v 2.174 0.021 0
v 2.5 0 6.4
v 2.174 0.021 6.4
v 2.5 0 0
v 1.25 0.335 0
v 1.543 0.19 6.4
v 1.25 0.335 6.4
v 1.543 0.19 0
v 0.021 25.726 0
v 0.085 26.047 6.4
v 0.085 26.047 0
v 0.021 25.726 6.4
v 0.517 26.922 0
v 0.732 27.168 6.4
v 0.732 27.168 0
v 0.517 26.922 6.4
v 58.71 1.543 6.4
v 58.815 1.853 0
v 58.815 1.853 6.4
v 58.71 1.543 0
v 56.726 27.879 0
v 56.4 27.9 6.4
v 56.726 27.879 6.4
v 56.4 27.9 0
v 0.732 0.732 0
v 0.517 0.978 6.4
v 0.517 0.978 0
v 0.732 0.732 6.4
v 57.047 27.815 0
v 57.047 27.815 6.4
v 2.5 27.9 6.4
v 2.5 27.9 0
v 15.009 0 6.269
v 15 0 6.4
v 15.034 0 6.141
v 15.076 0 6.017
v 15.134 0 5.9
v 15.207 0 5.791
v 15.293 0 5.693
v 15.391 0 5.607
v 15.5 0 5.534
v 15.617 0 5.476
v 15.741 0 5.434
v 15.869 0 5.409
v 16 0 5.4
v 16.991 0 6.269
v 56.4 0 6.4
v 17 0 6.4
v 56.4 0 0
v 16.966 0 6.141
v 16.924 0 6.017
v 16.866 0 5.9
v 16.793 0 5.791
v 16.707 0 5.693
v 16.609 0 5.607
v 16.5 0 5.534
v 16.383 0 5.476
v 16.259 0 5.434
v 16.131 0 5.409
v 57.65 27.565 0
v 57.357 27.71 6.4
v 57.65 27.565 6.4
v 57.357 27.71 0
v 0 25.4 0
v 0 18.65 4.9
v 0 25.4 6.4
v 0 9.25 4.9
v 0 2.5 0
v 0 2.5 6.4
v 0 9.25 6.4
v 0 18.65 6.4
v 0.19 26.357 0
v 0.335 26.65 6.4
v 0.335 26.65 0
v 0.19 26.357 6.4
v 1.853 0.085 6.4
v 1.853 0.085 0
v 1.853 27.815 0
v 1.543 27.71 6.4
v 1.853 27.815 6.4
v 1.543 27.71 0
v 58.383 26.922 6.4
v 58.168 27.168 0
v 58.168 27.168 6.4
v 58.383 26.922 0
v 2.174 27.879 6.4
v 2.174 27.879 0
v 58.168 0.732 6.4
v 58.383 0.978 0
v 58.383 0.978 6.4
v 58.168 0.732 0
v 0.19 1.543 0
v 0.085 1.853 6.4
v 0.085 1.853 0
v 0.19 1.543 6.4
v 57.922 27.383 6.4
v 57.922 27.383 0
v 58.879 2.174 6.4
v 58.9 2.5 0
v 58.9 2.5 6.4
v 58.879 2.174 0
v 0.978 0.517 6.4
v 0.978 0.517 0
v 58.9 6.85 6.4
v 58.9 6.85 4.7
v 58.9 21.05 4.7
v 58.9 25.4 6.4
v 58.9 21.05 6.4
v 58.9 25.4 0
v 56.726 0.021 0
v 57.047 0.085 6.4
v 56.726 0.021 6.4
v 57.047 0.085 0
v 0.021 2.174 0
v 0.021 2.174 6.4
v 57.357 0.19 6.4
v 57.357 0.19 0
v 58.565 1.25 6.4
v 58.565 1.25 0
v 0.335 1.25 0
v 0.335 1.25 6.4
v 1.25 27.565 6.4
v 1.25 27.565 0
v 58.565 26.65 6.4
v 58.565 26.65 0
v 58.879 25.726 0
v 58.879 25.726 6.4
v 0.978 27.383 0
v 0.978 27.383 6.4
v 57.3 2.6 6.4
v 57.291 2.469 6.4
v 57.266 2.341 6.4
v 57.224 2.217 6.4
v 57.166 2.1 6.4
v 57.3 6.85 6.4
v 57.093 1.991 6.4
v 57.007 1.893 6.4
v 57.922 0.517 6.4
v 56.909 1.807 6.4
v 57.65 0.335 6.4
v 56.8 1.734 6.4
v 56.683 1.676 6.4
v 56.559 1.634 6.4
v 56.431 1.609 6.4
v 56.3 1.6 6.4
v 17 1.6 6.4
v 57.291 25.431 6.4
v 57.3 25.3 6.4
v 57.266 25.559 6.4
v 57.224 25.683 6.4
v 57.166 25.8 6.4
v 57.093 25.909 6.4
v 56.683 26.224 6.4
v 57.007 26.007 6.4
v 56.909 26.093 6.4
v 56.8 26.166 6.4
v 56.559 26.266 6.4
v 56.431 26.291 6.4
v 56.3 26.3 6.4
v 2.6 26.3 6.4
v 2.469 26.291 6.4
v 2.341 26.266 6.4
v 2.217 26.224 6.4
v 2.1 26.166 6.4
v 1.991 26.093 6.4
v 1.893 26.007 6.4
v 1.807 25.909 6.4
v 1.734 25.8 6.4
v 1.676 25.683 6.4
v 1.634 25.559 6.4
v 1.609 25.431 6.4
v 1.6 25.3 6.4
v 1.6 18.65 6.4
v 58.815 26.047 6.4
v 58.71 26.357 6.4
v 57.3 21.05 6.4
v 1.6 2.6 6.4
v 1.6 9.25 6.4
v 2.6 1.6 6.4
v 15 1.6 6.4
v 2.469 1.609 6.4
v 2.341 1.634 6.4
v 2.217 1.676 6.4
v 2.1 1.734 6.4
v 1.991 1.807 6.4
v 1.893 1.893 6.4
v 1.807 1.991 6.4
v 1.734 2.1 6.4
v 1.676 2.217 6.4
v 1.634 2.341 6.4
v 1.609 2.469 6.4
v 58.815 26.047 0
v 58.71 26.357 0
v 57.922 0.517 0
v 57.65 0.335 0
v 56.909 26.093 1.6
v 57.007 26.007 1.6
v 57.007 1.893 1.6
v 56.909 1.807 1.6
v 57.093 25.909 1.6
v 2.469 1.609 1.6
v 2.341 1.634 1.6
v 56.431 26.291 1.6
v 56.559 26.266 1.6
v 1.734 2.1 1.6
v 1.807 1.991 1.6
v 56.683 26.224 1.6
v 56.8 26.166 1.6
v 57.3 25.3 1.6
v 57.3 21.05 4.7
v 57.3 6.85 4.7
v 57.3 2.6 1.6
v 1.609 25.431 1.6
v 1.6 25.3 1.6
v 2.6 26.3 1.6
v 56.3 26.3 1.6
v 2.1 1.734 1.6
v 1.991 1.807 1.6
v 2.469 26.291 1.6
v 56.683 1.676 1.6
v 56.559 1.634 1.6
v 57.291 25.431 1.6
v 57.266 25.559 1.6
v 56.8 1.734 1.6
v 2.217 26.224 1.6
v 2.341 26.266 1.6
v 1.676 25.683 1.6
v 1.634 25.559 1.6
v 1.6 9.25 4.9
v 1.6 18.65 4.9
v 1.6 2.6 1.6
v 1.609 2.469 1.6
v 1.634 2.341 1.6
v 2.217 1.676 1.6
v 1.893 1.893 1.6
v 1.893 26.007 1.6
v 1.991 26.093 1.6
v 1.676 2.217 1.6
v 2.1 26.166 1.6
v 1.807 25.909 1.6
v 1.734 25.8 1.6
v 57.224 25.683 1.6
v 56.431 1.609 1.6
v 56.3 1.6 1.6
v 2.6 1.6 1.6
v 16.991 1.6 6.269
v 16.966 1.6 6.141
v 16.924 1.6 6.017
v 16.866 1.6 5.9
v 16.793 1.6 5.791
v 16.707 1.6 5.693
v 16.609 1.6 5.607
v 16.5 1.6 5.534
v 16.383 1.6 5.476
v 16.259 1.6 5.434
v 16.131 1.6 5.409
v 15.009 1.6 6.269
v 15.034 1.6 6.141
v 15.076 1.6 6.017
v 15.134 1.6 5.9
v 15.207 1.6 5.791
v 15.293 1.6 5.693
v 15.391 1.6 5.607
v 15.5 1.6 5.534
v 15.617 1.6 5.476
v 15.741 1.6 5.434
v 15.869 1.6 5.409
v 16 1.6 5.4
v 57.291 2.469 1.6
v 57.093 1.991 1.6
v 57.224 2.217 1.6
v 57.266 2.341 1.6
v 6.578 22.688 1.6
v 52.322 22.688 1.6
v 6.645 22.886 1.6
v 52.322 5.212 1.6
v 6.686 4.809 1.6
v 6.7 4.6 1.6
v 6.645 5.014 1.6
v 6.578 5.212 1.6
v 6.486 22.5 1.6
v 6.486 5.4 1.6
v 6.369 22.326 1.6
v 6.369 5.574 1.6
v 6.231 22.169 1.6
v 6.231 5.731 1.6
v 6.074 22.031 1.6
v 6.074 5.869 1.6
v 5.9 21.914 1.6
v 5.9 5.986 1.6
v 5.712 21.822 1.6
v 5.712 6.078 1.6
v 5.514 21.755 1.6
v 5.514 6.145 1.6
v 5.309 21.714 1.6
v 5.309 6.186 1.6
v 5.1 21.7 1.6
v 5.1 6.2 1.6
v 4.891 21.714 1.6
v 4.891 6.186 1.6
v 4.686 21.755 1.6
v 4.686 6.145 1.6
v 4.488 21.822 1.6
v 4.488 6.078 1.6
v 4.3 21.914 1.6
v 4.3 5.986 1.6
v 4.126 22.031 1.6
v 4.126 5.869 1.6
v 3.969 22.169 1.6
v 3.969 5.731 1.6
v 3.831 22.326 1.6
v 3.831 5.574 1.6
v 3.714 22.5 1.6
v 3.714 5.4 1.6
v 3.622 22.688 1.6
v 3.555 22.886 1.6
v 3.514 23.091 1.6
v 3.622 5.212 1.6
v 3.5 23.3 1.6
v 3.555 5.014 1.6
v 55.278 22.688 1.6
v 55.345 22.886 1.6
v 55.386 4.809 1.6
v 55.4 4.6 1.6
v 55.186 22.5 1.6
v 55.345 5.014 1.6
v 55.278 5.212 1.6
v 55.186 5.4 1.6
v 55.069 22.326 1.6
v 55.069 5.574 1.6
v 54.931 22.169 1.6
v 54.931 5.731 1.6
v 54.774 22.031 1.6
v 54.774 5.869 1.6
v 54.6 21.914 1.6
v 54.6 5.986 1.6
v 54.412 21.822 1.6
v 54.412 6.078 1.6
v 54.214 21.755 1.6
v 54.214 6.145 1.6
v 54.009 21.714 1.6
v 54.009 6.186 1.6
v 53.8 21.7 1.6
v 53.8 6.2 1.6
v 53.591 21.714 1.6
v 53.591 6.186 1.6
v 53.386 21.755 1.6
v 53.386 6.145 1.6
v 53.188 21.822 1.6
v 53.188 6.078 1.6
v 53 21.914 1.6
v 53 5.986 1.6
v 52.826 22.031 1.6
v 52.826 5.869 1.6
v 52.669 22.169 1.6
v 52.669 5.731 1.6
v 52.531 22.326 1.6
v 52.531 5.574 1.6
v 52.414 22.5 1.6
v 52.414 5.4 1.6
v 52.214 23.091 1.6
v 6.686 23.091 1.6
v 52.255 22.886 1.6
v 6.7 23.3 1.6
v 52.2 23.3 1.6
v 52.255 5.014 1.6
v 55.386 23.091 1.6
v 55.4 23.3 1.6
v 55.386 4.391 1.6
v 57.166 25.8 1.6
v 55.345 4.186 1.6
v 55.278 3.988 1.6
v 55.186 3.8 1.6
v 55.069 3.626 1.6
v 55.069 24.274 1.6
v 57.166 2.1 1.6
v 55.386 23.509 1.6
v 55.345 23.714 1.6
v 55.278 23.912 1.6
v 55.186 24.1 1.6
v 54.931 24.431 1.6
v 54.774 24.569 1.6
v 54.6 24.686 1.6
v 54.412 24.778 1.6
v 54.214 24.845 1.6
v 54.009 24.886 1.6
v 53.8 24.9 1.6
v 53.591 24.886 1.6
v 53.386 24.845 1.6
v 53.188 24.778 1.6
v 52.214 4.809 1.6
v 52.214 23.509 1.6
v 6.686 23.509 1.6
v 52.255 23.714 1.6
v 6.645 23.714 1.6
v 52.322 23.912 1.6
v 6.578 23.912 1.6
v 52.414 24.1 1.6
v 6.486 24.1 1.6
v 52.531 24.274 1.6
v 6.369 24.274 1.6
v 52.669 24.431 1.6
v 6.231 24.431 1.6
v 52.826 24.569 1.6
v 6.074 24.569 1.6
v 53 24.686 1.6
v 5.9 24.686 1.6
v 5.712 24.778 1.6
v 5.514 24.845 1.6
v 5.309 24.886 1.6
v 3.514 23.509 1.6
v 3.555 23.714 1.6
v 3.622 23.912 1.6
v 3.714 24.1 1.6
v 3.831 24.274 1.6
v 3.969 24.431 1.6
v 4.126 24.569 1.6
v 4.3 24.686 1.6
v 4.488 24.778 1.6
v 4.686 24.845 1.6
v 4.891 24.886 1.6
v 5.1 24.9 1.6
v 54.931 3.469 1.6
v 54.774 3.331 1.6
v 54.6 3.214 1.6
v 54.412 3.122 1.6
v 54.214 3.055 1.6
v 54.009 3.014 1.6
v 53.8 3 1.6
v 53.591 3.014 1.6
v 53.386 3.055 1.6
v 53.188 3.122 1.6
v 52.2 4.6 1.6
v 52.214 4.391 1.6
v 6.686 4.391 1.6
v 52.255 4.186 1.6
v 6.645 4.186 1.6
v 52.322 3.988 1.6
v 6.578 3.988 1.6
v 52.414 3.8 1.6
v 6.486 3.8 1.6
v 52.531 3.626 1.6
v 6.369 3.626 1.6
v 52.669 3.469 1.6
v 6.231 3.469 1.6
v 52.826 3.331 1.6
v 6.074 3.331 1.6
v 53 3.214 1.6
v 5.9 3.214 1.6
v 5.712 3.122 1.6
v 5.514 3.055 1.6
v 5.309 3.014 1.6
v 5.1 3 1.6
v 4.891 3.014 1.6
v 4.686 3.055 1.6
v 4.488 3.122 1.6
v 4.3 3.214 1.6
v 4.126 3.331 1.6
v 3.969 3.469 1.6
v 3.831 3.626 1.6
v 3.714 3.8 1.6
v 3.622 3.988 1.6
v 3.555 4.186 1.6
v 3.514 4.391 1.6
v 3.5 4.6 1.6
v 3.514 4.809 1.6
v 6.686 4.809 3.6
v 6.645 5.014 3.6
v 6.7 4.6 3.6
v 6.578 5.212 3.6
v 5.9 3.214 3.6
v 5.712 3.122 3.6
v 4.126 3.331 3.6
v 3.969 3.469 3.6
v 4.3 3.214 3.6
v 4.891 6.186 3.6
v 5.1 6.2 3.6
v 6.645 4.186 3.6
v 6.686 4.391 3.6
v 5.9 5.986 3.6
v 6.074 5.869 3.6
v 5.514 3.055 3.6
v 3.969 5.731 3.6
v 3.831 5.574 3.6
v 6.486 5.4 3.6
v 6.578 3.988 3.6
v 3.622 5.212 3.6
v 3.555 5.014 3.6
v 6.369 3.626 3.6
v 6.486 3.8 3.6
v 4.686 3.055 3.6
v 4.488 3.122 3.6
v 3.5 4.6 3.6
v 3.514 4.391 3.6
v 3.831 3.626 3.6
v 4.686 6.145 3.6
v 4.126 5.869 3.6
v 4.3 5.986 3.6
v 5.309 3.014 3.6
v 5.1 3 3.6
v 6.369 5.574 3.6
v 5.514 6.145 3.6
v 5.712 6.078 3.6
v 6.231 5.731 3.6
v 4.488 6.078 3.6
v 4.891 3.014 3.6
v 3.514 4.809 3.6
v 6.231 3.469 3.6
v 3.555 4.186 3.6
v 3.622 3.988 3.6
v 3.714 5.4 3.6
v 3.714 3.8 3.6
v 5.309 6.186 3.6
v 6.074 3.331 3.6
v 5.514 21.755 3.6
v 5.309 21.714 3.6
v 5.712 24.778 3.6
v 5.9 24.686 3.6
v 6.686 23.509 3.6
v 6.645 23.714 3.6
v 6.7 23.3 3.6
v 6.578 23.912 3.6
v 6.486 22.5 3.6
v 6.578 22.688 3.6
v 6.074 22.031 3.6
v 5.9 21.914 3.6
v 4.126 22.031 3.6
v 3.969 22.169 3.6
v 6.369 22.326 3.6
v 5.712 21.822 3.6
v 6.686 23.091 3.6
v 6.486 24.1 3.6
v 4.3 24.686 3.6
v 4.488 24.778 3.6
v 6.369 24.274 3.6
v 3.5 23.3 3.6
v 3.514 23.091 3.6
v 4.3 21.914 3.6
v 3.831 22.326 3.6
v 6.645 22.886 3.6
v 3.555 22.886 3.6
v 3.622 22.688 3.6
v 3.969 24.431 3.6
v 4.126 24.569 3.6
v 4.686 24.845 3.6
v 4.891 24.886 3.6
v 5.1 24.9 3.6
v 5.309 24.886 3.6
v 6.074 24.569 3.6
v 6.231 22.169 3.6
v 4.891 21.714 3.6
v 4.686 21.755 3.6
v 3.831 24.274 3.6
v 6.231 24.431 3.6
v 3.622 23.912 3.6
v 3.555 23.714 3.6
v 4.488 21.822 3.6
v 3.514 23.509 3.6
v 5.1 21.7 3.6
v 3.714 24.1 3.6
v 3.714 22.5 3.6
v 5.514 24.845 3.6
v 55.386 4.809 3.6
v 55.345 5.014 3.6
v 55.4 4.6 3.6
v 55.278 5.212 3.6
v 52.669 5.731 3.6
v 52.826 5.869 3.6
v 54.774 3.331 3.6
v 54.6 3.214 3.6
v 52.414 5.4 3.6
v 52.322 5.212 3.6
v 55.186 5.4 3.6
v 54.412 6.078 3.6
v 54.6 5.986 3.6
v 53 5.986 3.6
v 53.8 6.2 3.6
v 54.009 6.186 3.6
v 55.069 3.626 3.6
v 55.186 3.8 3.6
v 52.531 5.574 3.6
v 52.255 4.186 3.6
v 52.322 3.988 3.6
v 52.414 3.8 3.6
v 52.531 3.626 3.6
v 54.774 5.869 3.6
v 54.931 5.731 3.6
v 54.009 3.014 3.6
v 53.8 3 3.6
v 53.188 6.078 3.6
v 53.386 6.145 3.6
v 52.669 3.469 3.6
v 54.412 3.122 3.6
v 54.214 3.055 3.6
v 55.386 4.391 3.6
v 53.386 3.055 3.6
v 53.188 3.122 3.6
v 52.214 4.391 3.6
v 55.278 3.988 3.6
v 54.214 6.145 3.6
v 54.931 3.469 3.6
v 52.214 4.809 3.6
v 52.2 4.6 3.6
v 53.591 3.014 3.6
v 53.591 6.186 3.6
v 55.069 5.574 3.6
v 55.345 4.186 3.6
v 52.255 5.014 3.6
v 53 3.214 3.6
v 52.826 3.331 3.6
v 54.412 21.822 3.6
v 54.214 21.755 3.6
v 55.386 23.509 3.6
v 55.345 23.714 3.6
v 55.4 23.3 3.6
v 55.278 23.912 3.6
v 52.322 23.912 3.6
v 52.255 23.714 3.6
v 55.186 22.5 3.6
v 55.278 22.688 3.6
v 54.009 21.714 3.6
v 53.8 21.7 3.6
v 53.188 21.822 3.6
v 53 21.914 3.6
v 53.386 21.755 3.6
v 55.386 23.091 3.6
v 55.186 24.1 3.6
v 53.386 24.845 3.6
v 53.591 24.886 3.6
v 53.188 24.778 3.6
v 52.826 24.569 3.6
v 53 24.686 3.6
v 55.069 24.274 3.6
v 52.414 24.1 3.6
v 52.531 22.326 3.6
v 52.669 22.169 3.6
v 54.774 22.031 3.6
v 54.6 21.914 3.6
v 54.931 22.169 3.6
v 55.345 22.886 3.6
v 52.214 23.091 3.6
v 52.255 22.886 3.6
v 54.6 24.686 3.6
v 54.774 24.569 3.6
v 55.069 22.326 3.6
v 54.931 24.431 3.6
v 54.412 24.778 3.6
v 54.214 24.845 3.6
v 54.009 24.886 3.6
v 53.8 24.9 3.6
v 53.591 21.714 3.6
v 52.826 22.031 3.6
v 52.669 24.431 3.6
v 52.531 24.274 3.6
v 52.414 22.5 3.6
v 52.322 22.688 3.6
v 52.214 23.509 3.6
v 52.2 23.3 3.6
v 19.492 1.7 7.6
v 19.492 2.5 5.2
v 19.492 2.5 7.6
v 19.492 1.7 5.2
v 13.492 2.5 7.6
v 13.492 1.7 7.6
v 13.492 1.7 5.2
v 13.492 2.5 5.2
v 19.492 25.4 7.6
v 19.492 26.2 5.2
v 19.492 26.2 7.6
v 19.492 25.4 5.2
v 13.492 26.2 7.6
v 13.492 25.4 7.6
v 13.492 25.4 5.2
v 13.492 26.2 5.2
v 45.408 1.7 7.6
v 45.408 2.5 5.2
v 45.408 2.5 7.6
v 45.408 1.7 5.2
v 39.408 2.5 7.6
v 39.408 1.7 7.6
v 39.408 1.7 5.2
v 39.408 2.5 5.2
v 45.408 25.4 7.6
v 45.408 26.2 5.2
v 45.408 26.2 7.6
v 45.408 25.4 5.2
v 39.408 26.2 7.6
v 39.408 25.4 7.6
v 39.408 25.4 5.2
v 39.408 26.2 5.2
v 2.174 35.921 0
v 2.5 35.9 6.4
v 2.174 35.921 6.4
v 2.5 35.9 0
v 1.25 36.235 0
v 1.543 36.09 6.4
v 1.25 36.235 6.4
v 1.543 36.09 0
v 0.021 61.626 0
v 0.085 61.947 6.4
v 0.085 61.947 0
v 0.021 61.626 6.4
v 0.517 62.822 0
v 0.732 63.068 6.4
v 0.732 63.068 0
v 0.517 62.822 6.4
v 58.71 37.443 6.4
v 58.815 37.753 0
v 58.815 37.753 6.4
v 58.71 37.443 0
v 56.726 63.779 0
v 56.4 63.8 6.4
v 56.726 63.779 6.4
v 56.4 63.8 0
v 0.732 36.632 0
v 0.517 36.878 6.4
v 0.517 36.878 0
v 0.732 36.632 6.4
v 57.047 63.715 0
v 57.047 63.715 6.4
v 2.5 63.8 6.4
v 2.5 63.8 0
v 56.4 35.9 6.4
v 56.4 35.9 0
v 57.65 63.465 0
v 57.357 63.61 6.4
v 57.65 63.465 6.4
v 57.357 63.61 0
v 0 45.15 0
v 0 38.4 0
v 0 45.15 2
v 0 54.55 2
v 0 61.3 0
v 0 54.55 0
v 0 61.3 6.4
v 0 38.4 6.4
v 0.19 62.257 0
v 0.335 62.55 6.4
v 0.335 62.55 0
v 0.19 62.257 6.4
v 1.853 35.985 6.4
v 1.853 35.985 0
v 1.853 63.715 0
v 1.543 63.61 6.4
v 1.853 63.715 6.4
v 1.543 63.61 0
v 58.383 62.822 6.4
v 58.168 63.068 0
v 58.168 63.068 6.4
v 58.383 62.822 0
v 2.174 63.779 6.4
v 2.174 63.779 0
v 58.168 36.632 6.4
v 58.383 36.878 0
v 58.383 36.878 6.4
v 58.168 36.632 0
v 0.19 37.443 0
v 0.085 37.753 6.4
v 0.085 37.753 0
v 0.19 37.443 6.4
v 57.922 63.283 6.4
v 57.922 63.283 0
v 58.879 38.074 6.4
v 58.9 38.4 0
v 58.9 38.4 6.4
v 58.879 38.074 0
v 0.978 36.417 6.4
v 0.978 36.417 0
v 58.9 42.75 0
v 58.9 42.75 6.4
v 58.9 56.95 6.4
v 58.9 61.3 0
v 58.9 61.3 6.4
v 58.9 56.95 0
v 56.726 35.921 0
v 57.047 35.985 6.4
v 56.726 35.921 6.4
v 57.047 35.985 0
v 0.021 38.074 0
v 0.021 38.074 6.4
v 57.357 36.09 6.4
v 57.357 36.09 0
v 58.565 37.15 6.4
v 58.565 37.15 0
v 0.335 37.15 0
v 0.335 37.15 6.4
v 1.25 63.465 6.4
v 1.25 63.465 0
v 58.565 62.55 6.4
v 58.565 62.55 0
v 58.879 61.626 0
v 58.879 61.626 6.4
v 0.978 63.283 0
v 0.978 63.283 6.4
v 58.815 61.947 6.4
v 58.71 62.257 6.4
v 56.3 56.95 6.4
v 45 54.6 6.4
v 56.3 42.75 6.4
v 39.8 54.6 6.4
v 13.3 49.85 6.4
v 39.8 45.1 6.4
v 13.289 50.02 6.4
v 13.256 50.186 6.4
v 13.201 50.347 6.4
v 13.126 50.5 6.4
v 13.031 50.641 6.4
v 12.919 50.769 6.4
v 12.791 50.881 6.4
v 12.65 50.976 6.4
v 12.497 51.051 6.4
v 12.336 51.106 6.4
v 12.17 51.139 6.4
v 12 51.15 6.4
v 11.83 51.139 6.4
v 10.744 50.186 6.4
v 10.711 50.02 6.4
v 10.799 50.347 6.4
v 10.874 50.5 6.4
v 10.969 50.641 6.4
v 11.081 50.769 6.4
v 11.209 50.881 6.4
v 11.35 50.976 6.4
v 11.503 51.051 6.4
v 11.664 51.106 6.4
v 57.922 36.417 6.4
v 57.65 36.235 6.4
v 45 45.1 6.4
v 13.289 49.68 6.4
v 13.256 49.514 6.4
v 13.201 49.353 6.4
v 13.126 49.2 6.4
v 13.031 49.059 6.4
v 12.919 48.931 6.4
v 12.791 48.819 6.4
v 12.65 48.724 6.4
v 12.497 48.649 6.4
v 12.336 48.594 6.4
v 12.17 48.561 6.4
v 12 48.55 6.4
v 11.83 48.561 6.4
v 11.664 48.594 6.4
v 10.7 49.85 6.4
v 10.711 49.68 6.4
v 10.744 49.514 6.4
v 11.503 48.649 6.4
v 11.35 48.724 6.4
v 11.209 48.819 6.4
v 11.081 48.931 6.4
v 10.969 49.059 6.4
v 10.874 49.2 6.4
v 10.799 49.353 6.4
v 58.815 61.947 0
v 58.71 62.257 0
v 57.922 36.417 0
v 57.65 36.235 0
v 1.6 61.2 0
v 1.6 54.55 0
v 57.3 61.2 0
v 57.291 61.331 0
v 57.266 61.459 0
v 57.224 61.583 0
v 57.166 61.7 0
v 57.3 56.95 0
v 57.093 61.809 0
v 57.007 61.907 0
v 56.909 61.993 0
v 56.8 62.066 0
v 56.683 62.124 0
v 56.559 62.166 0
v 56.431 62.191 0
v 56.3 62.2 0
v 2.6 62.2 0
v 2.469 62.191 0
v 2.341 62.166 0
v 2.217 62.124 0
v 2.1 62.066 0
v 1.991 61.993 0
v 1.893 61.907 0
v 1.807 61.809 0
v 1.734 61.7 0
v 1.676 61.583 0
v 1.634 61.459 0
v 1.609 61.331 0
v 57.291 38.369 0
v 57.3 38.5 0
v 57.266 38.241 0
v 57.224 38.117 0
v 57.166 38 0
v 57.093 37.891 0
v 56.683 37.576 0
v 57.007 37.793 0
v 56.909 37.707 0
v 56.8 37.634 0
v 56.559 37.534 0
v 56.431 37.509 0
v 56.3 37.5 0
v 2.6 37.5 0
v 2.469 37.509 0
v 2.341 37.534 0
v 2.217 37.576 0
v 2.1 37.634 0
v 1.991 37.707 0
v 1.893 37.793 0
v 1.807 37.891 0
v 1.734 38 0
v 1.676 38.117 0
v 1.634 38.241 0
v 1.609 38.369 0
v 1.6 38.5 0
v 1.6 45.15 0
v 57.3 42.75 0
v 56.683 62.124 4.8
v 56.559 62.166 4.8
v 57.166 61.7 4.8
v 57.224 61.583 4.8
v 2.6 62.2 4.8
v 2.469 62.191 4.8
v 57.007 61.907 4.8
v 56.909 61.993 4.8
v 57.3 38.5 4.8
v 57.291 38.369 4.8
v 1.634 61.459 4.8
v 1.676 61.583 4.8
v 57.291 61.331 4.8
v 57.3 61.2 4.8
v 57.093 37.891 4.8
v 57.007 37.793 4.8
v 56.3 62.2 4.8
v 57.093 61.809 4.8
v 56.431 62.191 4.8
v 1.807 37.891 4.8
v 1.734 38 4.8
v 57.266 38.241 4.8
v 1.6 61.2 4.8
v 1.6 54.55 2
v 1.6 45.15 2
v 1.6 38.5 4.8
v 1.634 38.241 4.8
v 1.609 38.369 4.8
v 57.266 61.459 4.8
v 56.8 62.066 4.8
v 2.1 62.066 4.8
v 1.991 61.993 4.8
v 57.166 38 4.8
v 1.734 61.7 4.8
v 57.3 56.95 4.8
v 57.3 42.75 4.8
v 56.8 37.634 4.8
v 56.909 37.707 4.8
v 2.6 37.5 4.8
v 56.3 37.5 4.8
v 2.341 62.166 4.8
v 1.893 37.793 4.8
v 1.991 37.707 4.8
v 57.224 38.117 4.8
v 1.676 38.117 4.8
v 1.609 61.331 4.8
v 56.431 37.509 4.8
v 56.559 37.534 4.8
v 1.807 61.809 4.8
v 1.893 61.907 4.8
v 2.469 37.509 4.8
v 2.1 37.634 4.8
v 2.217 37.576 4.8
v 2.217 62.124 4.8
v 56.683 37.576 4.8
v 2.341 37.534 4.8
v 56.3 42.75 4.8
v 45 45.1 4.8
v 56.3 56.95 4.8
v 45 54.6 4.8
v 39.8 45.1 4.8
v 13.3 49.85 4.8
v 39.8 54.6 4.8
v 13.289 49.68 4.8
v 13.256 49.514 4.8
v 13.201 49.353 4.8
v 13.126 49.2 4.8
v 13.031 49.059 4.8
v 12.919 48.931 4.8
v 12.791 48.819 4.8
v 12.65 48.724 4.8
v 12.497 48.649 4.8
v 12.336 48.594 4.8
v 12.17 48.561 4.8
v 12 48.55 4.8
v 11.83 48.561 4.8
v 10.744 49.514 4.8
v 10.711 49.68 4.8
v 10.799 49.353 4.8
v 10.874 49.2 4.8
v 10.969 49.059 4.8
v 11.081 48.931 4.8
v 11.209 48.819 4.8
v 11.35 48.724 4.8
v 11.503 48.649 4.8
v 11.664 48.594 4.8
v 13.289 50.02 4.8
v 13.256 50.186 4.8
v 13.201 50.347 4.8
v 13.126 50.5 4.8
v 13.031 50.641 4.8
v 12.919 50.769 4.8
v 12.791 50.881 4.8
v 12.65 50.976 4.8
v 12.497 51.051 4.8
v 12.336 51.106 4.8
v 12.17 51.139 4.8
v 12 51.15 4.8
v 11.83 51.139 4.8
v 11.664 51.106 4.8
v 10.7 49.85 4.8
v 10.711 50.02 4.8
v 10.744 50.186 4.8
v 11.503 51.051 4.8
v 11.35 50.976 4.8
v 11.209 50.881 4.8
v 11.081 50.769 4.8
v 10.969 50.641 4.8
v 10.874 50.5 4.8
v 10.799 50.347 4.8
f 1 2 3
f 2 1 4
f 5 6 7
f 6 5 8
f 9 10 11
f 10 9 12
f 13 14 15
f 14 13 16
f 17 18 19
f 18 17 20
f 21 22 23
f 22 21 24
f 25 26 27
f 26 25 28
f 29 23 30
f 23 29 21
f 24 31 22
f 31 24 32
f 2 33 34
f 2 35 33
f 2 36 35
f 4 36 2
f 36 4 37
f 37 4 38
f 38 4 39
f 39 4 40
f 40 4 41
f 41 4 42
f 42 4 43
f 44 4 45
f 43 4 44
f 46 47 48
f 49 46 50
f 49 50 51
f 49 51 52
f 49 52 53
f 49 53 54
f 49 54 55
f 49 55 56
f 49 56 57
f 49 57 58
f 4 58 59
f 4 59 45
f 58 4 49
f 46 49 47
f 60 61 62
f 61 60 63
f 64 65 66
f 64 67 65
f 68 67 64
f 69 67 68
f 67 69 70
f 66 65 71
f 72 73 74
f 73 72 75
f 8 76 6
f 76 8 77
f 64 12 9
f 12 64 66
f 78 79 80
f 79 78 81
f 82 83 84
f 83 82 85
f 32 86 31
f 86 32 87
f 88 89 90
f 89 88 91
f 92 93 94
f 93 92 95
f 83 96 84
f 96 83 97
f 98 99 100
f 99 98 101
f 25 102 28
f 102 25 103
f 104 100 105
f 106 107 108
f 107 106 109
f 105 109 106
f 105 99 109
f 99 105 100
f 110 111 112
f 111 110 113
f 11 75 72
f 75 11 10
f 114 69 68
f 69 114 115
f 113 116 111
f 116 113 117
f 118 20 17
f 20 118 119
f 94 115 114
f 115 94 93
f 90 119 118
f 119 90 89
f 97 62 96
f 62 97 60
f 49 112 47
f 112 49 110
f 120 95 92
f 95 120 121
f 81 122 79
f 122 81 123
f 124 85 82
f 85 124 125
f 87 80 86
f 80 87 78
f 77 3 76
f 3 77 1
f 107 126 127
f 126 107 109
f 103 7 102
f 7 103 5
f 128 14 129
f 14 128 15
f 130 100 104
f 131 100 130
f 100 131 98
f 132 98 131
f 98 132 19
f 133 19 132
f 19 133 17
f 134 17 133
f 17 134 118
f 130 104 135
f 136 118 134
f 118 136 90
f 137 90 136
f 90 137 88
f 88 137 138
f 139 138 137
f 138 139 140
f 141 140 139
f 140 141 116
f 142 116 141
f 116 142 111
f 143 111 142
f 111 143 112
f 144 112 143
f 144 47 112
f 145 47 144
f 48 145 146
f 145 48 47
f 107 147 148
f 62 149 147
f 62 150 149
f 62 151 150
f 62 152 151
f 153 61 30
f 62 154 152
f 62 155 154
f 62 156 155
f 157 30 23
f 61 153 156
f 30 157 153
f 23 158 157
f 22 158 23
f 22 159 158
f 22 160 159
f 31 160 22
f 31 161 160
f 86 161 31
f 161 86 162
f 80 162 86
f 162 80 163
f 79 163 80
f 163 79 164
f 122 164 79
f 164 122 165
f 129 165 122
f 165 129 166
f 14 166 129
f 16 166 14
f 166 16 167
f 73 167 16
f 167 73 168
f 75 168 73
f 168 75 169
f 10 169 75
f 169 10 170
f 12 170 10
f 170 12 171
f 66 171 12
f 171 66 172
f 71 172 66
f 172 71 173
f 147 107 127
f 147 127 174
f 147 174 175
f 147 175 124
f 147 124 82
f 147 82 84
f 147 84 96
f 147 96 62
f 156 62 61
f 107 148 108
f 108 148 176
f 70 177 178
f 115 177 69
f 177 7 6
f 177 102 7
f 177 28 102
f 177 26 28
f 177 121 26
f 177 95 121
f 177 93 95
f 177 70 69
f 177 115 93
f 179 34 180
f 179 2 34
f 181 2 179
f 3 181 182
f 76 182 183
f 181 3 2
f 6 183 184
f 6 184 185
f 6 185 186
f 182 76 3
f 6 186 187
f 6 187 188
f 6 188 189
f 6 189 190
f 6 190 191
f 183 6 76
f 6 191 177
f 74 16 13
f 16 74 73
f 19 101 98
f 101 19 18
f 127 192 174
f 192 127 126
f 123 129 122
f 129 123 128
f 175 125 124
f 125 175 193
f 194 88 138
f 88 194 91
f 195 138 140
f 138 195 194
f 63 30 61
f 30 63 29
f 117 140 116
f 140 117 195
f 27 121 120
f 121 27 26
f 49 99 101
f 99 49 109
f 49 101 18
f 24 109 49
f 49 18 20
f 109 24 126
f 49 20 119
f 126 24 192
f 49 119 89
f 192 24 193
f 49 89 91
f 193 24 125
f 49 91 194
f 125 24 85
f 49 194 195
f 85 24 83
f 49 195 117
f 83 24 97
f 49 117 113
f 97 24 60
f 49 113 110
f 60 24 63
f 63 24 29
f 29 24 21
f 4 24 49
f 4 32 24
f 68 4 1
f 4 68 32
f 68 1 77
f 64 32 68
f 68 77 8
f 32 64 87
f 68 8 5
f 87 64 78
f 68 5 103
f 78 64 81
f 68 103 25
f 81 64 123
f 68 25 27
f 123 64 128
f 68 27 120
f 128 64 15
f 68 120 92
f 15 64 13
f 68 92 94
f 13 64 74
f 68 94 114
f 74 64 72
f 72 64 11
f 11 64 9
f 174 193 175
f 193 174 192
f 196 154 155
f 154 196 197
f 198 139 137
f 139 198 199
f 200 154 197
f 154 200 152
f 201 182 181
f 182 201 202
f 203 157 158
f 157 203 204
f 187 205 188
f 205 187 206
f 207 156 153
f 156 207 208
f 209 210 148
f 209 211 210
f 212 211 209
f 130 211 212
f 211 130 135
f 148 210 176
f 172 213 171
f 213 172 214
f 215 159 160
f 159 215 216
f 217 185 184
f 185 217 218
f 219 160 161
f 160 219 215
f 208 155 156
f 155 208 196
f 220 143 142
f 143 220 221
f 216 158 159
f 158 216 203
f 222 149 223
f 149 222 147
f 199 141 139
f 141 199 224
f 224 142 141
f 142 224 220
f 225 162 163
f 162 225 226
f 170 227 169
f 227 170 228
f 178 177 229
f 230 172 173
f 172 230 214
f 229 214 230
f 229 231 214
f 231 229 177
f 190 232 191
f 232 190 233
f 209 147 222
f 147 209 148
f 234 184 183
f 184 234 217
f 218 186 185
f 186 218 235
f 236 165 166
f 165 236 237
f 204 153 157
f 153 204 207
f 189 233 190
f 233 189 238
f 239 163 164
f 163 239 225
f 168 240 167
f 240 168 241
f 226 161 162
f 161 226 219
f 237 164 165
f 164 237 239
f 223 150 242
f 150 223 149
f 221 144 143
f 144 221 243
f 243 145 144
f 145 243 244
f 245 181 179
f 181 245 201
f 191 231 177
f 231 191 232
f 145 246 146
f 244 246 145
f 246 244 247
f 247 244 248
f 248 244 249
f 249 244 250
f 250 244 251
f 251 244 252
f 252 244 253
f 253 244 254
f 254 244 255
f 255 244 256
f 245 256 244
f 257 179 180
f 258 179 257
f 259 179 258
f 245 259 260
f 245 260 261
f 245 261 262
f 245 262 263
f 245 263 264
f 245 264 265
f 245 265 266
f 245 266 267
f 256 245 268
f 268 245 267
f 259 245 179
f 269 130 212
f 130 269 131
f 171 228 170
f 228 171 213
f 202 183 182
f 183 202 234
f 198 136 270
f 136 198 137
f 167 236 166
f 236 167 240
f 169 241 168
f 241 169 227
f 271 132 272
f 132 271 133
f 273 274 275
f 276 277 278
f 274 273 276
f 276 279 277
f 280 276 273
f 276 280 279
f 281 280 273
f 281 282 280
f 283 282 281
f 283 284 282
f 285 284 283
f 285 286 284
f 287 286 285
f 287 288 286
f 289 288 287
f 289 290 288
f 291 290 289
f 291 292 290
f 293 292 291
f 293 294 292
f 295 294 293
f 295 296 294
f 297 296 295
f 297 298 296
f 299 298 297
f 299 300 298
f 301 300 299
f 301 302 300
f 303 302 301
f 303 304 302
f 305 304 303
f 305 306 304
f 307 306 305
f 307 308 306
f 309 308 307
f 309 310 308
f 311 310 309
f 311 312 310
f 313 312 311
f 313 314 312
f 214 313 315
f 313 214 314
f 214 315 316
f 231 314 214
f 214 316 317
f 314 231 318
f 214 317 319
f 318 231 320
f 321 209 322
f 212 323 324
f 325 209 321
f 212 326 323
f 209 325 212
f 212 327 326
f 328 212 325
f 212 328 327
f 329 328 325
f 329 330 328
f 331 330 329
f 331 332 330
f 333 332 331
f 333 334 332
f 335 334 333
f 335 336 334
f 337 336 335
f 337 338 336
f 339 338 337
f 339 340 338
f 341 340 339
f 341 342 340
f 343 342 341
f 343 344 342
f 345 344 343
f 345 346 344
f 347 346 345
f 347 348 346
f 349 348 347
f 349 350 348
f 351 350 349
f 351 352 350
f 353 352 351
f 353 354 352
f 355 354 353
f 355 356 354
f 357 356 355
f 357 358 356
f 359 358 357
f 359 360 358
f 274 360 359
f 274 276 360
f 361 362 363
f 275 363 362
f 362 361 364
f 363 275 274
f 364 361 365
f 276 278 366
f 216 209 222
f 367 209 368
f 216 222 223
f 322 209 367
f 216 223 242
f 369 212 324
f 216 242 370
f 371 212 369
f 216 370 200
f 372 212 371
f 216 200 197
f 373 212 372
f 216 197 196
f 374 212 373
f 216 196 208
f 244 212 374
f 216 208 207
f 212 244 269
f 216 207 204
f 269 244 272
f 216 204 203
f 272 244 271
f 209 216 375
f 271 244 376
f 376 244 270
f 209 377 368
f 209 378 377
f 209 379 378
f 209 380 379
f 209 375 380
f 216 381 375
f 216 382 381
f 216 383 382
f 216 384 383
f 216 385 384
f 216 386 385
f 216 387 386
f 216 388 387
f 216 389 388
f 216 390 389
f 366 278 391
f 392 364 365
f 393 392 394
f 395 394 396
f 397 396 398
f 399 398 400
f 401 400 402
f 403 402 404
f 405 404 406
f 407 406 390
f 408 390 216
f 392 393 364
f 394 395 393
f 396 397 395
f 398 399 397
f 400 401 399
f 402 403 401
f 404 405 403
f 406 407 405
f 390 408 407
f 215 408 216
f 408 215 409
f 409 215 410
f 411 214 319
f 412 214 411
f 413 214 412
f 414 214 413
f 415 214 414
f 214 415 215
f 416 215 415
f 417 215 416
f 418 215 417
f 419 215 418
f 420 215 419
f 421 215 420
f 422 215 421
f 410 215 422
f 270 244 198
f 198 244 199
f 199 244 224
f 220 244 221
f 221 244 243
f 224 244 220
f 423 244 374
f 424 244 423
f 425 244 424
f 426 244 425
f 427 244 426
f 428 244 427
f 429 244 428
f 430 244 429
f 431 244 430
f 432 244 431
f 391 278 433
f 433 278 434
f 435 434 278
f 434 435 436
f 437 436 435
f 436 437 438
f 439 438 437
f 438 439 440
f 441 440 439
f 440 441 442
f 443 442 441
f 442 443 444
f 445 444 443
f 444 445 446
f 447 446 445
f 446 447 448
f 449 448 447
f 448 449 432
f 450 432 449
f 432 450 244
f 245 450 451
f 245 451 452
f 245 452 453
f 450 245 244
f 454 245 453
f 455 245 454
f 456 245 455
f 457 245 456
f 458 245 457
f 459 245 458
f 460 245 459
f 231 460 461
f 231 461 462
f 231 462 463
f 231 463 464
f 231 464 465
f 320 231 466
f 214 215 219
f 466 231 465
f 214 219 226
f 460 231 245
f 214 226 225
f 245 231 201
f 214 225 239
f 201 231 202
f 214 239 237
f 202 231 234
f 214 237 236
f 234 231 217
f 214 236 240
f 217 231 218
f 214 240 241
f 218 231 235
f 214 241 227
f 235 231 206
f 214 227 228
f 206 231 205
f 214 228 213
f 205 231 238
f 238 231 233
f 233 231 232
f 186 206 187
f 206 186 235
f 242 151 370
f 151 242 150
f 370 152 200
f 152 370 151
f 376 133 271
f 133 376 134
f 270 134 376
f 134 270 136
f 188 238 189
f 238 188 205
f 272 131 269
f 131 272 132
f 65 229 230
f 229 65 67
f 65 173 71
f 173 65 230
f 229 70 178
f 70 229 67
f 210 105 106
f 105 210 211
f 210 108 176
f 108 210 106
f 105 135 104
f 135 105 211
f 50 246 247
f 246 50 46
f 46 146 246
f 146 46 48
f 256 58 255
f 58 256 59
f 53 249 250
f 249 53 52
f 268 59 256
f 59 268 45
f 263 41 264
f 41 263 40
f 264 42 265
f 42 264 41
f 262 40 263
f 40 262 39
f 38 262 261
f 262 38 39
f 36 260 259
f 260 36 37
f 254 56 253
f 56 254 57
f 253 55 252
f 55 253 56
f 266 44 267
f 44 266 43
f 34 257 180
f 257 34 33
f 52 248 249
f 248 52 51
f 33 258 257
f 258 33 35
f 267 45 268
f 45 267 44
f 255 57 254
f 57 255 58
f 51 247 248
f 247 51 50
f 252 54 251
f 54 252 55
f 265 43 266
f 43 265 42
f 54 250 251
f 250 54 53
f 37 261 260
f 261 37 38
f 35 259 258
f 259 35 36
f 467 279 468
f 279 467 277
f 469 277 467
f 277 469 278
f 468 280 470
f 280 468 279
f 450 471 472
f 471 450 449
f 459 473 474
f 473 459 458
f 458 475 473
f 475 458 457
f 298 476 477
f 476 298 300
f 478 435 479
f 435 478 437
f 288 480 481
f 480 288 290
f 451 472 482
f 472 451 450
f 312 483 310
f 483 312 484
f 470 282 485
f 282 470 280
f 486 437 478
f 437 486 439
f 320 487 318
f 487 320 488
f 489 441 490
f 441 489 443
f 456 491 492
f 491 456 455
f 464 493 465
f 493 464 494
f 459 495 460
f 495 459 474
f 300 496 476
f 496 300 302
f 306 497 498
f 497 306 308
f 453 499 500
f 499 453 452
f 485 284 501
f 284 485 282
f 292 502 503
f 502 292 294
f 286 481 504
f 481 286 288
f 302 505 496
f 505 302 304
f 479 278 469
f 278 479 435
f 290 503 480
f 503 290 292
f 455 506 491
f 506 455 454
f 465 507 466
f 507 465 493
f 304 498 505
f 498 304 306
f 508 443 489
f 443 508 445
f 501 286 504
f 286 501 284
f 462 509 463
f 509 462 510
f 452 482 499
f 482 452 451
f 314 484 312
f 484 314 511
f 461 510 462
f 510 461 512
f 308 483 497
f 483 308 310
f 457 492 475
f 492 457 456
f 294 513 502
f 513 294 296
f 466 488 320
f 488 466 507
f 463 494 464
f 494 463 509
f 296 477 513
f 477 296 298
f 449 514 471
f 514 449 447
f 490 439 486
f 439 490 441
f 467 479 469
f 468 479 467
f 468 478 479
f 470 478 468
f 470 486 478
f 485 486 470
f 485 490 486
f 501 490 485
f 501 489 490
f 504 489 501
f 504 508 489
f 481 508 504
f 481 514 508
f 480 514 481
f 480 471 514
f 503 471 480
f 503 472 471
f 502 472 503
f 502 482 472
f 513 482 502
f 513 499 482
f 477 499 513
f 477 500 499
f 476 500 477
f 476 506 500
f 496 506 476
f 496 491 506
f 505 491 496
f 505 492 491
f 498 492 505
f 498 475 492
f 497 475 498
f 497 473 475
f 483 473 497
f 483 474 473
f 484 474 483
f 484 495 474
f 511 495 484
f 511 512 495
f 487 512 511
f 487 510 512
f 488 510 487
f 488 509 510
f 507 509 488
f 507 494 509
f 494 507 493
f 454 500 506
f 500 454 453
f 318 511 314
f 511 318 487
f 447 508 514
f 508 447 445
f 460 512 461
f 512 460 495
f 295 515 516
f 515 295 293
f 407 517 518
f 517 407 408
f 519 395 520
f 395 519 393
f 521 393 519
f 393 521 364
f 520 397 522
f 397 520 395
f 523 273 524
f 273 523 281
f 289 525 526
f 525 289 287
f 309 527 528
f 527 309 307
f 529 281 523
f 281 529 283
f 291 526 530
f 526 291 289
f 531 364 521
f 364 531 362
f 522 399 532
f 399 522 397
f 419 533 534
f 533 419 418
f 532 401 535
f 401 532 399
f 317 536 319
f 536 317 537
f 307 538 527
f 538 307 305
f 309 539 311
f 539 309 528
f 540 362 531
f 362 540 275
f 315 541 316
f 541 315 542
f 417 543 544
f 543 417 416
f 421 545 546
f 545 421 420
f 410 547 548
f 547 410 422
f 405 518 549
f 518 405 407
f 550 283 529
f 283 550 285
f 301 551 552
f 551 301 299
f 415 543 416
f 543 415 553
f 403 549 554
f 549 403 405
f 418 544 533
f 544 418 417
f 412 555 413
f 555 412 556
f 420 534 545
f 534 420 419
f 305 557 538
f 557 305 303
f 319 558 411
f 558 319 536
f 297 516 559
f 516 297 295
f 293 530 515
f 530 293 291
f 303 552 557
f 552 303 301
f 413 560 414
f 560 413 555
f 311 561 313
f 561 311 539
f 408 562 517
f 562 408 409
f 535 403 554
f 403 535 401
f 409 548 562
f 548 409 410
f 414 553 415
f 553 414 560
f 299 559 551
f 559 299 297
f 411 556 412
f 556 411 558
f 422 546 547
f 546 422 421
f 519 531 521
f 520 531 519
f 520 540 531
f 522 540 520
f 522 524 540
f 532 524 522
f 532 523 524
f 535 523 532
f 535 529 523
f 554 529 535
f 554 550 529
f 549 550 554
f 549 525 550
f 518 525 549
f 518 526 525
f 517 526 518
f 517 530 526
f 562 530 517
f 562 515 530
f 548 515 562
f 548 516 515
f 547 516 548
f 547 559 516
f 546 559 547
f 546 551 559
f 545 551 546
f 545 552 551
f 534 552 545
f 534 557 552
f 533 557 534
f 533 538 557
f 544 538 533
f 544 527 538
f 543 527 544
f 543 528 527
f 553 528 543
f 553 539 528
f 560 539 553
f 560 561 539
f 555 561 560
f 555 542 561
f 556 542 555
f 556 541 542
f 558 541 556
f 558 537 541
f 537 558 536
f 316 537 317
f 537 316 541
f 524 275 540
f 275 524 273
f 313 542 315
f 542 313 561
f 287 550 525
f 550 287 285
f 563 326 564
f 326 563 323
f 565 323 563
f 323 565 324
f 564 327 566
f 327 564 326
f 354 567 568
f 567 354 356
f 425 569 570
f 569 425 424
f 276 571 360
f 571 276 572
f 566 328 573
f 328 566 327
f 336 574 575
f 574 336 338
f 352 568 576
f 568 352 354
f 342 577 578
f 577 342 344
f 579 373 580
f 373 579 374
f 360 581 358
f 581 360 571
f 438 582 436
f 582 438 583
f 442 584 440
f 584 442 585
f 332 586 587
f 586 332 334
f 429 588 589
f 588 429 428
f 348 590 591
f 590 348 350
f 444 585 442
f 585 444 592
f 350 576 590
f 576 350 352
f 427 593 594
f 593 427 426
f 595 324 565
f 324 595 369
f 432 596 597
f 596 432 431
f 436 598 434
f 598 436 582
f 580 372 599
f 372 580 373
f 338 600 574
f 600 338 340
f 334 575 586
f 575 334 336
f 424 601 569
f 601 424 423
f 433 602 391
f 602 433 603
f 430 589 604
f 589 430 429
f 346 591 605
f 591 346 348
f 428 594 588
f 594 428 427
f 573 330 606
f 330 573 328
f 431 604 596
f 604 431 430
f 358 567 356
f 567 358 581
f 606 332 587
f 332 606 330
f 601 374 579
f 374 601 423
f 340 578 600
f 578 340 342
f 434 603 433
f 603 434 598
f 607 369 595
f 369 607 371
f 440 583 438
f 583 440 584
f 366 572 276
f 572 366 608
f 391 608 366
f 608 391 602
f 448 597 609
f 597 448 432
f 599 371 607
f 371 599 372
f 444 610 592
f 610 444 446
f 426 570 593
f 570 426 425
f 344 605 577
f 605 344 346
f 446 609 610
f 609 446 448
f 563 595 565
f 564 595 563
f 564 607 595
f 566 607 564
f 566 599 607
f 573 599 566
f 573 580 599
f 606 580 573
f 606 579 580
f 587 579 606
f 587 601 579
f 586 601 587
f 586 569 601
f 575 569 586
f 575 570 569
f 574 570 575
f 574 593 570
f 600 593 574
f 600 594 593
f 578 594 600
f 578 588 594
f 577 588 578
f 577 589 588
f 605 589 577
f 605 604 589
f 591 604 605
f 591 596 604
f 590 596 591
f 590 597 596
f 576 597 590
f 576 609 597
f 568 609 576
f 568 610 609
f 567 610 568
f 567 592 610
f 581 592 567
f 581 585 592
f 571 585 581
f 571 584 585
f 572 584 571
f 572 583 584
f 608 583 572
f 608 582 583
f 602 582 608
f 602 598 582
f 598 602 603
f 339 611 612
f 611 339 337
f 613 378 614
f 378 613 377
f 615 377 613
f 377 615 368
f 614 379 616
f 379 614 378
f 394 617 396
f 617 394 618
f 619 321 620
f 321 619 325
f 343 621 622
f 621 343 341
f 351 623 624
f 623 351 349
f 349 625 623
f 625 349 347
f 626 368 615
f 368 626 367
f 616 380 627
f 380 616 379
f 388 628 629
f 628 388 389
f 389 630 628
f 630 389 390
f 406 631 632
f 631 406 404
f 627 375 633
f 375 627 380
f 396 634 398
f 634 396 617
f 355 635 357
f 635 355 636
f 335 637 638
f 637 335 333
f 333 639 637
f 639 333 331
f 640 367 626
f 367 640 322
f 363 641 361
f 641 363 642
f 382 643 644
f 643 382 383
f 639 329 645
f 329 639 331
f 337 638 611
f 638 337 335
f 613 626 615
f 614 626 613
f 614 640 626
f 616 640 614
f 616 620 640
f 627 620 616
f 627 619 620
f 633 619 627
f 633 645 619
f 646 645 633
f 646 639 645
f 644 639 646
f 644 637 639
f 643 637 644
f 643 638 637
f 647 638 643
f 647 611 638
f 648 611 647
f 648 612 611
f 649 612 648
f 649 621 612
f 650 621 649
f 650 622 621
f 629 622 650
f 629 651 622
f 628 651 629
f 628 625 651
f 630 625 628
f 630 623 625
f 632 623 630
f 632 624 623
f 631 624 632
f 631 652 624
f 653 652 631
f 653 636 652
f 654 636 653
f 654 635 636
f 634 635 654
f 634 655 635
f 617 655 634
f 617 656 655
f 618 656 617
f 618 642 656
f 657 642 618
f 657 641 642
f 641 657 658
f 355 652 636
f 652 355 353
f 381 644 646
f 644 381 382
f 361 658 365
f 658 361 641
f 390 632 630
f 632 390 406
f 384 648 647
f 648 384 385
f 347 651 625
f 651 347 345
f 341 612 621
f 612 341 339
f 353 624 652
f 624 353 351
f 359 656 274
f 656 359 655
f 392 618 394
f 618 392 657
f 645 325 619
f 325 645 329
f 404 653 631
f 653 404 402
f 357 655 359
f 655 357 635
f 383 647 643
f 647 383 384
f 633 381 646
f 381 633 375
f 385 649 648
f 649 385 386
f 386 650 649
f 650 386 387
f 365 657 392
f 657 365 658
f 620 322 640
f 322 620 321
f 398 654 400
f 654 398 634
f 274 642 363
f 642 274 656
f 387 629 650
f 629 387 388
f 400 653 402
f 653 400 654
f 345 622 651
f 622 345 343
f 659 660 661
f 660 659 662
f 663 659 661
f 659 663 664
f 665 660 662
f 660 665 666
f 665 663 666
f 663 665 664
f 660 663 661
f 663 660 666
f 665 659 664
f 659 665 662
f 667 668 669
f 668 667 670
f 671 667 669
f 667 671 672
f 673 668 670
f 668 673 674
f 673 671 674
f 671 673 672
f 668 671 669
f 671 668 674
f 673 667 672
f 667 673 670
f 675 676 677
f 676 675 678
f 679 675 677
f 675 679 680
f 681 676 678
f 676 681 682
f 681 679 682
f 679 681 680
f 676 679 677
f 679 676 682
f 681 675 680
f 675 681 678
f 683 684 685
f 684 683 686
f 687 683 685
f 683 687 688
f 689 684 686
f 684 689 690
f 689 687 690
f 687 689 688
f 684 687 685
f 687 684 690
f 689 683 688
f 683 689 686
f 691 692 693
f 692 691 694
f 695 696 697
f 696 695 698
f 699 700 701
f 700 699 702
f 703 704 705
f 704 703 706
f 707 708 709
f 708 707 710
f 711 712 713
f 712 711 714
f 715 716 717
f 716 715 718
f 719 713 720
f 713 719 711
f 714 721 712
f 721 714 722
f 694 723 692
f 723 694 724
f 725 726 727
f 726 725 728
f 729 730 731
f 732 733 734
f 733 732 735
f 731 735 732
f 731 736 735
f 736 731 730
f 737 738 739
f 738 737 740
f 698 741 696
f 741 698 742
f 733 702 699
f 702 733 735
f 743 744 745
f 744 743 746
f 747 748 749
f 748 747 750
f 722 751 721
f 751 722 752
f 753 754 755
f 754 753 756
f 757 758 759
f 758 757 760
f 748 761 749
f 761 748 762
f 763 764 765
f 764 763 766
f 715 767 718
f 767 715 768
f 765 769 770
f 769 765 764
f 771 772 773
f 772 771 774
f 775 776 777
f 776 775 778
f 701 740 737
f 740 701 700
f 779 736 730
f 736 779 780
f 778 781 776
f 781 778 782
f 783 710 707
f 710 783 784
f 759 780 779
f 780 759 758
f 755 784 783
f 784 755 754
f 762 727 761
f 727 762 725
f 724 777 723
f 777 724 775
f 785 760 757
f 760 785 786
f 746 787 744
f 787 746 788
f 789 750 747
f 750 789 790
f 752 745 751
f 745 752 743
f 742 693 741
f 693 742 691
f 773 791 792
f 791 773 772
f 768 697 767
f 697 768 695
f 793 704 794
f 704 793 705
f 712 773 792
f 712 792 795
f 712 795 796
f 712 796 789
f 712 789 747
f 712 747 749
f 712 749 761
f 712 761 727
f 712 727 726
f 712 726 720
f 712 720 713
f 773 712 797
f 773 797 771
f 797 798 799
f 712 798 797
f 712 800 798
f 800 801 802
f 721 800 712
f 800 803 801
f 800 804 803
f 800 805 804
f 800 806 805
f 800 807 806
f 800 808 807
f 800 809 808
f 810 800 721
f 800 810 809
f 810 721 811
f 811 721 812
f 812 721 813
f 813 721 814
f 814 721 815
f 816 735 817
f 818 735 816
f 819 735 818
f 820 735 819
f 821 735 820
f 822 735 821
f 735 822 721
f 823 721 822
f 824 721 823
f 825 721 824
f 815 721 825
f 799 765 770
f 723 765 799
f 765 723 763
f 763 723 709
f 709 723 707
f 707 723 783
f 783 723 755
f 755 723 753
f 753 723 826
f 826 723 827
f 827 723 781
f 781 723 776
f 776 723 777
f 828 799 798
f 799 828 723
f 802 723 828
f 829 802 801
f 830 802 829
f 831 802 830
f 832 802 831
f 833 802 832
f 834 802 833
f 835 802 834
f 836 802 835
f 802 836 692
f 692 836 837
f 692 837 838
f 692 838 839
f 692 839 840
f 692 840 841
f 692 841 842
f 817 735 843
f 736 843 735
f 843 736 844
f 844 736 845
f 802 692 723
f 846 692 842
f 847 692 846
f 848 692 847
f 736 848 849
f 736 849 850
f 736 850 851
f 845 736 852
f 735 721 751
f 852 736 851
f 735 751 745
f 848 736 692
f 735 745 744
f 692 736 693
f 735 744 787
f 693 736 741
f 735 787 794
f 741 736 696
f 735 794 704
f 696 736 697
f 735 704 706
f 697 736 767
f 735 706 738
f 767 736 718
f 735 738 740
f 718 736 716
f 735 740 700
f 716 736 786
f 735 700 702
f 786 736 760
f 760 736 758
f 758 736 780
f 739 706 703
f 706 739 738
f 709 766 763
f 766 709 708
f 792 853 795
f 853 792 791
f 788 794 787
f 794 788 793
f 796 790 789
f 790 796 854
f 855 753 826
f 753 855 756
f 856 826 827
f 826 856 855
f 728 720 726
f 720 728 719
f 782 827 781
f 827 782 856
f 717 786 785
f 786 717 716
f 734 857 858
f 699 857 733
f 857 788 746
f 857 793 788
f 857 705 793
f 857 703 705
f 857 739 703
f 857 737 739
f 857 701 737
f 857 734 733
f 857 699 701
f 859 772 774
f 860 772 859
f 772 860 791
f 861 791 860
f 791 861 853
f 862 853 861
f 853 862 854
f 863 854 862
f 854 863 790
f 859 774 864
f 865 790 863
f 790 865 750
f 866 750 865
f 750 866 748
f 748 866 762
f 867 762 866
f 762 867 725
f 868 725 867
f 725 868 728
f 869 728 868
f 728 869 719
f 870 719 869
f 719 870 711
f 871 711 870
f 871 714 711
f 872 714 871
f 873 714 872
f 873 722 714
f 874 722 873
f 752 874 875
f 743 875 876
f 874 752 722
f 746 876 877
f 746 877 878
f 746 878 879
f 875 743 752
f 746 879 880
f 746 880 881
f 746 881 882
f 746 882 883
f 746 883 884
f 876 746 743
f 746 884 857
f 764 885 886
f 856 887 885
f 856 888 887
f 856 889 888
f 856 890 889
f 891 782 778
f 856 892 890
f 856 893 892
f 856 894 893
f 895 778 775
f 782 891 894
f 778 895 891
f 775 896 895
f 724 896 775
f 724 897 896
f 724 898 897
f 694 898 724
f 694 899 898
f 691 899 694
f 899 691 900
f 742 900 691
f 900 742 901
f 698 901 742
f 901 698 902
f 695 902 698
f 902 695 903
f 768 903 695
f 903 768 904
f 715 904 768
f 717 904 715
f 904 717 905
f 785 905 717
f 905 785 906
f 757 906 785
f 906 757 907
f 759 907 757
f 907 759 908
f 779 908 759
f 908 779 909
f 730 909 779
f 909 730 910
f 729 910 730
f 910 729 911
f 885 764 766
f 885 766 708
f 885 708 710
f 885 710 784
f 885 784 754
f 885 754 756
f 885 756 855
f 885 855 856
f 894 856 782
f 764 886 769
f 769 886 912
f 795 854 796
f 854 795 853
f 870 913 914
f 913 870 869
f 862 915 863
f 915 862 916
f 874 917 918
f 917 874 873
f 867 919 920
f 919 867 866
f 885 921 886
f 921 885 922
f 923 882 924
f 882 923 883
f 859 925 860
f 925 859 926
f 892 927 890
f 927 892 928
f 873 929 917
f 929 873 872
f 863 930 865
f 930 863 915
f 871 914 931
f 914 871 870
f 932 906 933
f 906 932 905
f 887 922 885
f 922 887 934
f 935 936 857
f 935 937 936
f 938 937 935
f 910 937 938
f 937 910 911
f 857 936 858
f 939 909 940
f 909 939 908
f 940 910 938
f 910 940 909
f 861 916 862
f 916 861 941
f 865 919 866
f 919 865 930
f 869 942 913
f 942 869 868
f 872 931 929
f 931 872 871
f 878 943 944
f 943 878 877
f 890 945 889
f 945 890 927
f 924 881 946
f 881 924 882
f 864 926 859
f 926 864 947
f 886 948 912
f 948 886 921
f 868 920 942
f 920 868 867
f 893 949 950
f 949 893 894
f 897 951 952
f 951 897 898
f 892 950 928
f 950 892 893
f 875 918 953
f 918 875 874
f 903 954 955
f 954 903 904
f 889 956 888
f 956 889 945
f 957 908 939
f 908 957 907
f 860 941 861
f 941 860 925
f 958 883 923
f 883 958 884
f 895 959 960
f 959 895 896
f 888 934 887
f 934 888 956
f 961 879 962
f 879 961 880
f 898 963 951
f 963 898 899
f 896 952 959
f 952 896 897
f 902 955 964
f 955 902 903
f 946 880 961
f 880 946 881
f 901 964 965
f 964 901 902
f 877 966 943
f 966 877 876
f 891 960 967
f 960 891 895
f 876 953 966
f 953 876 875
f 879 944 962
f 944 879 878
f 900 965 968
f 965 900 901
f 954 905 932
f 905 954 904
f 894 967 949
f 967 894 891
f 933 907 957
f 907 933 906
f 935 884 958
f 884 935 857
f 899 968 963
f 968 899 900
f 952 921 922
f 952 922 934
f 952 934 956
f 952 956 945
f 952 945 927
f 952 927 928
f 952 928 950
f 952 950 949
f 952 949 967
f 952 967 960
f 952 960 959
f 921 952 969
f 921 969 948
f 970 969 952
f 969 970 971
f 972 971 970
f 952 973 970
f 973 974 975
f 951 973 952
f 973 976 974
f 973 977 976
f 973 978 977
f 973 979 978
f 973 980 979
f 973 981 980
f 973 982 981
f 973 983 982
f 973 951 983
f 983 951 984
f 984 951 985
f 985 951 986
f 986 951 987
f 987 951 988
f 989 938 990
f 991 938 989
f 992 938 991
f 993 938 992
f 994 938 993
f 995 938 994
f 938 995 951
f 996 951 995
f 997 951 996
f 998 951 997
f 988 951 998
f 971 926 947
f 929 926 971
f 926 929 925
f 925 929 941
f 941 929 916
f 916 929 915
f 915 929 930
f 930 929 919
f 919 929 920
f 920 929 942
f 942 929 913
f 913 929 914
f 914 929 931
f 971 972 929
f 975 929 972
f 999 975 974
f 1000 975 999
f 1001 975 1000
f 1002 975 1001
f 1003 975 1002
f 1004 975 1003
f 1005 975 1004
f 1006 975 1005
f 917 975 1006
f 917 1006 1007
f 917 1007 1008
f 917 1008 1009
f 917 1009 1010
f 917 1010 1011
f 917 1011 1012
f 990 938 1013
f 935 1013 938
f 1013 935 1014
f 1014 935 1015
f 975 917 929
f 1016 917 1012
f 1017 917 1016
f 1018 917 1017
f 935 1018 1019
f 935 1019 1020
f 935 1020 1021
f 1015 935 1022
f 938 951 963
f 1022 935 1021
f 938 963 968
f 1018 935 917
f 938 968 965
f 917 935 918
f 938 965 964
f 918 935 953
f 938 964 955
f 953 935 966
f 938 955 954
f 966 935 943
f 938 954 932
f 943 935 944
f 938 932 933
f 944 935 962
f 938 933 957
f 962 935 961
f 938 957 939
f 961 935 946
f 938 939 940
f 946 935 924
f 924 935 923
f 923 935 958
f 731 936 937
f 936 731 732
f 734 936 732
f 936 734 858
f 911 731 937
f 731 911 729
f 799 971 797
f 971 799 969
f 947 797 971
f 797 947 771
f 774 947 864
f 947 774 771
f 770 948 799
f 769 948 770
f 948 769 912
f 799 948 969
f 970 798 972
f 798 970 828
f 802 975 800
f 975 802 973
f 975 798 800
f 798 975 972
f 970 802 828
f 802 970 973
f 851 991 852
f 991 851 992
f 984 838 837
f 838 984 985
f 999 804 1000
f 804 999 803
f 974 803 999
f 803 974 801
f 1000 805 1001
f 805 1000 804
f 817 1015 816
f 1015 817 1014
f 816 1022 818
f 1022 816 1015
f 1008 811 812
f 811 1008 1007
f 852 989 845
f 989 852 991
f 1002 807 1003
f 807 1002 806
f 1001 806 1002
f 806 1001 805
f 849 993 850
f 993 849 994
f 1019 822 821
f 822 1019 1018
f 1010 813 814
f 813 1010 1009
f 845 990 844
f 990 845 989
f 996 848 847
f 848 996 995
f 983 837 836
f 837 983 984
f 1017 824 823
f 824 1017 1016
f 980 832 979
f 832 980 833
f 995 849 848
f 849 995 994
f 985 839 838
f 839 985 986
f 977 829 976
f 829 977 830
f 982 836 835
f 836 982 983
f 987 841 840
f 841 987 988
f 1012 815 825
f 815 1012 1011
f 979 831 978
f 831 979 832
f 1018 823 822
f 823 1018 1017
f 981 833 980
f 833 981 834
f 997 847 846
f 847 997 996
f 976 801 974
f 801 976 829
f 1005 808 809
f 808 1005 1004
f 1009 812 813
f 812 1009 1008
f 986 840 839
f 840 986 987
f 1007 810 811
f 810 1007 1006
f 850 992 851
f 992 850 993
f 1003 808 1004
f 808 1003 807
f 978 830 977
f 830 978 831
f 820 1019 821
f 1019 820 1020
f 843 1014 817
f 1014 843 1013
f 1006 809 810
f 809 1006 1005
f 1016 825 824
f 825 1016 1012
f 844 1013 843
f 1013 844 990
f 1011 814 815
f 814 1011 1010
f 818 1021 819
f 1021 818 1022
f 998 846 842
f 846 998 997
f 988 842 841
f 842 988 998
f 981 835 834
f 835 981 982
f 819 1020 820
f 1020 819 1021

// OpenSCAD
// Pico Universal Pro — Parametric Snap-Fit Consumer Enclosure (OpenSCAD)
// Matches 4-layer PU_BOARD_PRO_PCB (55.0 mm x 24.0 mm x 1.6 mm)
// Material: ABS / ASA (3D-printable for Rev A/B pilots; 1.5 deg draft-angle ready for injection molding)

$fn = 48;

// PCB dimensions
pcb_len   = 55.0;
pcb_wid   = 24.0;
pcb_thk   = 1.6;
clearance = 0.35;

// Shell parameters
wall      = 1.6;
floor_thk = 1.6;
ceil_thk  = 1.6;
pcb_z     = floor_thk + 2.0; // bottom clearance for pogo pads / through-hole pins
inner_h   = 9.6;             // accommodates 2.54mm shrouded box header + USB-C

outer_len = pcb_len + 2 * (wall + clearance);
outer_wid = pcb_wid + 2 * (wall + clearance);
outer_h   = floor_thk + inner_h + ceil_thk;
corner_r  = 2.5;

// Cutout specifications
usbc_w    = 9.4;
usbc_h    = 3.6;
hdr254_w  = 14.2; // 10-pin 2.54mm keyed shrouded box header
hdr254_h  = 9.2;
hdr127_w  = 9.5;  // 10-pin 1.27mm ARM Cortex header
hdr127_h  = 5.2;
led_d     = 2.6;  // RGB light-pipe aperture
btn_d     = 2.0;  // Recessed Recovery/BOOTSEL pinhole

module rounded_box(l, w, h, r) {
    hull() {
        for (x = [r, l - r]) {
            for (y = [r, w - r]) {
                translate([x, y, 0])
                    cylinder(h = h, r = r);
            }
        }
    }
}

module bottom_shell() {
    split_z = pcb_z + pcb_thk + 1.2;
    difference() {
        // Outer lower body
        rounded_box(outer_len, outer_wid, split_z, corner_r);

        // Inner cavity
        translate([wall, wall, floor_thk])
            rounded_box(outer_len - 2*wall, outer_wid - 2*wall, split_z, max(1.0, corner_r - wall));

        // USB-C cutout on X=0 face
        translate([-1, (outer_wid - usbc_w)/2, pcb_z + pcb_thk - 0.3])
            cube([wall + 3, usbc_w, usbc_h]);

        // Universal 10-pin 2.54mm header cutout on X=outer_len face
        translate([outer_len - wall - 1, (outer_wid - hdr254_w)/2, pcb_z + pcb_thk - 0.5])
            cube([wall + 3, hdr254_w, hdr254_h]);

        // Recessed Recovery/BOOTSEL pinhole on side face (Y=0)
        translate([16.0, -1, pcb_z + pcb_thk + 1.2])
            rotate([-90, 0, 0])
                cylinder(h = wall + 3, d = btn_d);
    }

    // Four PCB support standoffs
    for (sx = [wall + 3.5, outer_len - wall - 3.5]) {
        for (sy = [wall + 3.0, outer_wid - wall - 3.0]) {
            translate([sx, sy, floor_thk])
                cylinder(h = pcb_z - floor_thk, d = 3.2);
        }
    }

    // Four snap-fit cantilever hooks along long edges
    for (cx = [outer_len * 0.28, outer_len * 0.72]) {
        for (cy = [wall + 0.1, outer_wid - wall - 0.9]) {
            translate([cx - 3.0, cy, split_z - 1.2])
                cube([6.0, 0.8, 2.4]);
        }
    }
}

module top_shell() {
    split_z = pcb_z + pcb_thk + 1.2;
    top_h   = outer_h - split_z;
    difference() {
        rounded_box(outer_len, outer_wid, top_h, corner_r);

        // Inner cavity
        translate([wall, wall, -0.5])
            rounded_box(outer_len - 2*wall, outer_wid - 2*wall, top_h - ceil_thk + 0.5, max(1.0, corner_r - wall));

        // Upper half of USB-C aperture
        translate([-1, (outer_wid - usbc_w)/2, -0.5])
            cube([wall + 3, usbc_w, 2.5]);

        // Upper half of 2.54mm shrouded header aperture
        translate([outer_len - wall - 1, (outer_wid - hdr254_w)/2, -0.5])
            cube([wall + 3, hdr254_w, hdr254_h]);

        // Top-access 10-pin 1.27mm ARM Cortex header aperture
        translate([outer_len - wall - 17.5, (outer_wid - hdr127_w)/2, top_h - ceil_thk - 1])
            cube([hdr127_h, hdr127_w, ceil_thk + 2]);

        // Diffused RGB status LED light-pipe aperture
        translate([12.0, outer_wid/2, top_h - ceil_thk - 1])
            cylinder(h = ceil_thk + 2, d = led_d);
    }
}

// Render both shells side-by-side for printing / CAD export
bottom_shell();
translate([0, outer_wid + 8.0, 0])
    top_shell();
